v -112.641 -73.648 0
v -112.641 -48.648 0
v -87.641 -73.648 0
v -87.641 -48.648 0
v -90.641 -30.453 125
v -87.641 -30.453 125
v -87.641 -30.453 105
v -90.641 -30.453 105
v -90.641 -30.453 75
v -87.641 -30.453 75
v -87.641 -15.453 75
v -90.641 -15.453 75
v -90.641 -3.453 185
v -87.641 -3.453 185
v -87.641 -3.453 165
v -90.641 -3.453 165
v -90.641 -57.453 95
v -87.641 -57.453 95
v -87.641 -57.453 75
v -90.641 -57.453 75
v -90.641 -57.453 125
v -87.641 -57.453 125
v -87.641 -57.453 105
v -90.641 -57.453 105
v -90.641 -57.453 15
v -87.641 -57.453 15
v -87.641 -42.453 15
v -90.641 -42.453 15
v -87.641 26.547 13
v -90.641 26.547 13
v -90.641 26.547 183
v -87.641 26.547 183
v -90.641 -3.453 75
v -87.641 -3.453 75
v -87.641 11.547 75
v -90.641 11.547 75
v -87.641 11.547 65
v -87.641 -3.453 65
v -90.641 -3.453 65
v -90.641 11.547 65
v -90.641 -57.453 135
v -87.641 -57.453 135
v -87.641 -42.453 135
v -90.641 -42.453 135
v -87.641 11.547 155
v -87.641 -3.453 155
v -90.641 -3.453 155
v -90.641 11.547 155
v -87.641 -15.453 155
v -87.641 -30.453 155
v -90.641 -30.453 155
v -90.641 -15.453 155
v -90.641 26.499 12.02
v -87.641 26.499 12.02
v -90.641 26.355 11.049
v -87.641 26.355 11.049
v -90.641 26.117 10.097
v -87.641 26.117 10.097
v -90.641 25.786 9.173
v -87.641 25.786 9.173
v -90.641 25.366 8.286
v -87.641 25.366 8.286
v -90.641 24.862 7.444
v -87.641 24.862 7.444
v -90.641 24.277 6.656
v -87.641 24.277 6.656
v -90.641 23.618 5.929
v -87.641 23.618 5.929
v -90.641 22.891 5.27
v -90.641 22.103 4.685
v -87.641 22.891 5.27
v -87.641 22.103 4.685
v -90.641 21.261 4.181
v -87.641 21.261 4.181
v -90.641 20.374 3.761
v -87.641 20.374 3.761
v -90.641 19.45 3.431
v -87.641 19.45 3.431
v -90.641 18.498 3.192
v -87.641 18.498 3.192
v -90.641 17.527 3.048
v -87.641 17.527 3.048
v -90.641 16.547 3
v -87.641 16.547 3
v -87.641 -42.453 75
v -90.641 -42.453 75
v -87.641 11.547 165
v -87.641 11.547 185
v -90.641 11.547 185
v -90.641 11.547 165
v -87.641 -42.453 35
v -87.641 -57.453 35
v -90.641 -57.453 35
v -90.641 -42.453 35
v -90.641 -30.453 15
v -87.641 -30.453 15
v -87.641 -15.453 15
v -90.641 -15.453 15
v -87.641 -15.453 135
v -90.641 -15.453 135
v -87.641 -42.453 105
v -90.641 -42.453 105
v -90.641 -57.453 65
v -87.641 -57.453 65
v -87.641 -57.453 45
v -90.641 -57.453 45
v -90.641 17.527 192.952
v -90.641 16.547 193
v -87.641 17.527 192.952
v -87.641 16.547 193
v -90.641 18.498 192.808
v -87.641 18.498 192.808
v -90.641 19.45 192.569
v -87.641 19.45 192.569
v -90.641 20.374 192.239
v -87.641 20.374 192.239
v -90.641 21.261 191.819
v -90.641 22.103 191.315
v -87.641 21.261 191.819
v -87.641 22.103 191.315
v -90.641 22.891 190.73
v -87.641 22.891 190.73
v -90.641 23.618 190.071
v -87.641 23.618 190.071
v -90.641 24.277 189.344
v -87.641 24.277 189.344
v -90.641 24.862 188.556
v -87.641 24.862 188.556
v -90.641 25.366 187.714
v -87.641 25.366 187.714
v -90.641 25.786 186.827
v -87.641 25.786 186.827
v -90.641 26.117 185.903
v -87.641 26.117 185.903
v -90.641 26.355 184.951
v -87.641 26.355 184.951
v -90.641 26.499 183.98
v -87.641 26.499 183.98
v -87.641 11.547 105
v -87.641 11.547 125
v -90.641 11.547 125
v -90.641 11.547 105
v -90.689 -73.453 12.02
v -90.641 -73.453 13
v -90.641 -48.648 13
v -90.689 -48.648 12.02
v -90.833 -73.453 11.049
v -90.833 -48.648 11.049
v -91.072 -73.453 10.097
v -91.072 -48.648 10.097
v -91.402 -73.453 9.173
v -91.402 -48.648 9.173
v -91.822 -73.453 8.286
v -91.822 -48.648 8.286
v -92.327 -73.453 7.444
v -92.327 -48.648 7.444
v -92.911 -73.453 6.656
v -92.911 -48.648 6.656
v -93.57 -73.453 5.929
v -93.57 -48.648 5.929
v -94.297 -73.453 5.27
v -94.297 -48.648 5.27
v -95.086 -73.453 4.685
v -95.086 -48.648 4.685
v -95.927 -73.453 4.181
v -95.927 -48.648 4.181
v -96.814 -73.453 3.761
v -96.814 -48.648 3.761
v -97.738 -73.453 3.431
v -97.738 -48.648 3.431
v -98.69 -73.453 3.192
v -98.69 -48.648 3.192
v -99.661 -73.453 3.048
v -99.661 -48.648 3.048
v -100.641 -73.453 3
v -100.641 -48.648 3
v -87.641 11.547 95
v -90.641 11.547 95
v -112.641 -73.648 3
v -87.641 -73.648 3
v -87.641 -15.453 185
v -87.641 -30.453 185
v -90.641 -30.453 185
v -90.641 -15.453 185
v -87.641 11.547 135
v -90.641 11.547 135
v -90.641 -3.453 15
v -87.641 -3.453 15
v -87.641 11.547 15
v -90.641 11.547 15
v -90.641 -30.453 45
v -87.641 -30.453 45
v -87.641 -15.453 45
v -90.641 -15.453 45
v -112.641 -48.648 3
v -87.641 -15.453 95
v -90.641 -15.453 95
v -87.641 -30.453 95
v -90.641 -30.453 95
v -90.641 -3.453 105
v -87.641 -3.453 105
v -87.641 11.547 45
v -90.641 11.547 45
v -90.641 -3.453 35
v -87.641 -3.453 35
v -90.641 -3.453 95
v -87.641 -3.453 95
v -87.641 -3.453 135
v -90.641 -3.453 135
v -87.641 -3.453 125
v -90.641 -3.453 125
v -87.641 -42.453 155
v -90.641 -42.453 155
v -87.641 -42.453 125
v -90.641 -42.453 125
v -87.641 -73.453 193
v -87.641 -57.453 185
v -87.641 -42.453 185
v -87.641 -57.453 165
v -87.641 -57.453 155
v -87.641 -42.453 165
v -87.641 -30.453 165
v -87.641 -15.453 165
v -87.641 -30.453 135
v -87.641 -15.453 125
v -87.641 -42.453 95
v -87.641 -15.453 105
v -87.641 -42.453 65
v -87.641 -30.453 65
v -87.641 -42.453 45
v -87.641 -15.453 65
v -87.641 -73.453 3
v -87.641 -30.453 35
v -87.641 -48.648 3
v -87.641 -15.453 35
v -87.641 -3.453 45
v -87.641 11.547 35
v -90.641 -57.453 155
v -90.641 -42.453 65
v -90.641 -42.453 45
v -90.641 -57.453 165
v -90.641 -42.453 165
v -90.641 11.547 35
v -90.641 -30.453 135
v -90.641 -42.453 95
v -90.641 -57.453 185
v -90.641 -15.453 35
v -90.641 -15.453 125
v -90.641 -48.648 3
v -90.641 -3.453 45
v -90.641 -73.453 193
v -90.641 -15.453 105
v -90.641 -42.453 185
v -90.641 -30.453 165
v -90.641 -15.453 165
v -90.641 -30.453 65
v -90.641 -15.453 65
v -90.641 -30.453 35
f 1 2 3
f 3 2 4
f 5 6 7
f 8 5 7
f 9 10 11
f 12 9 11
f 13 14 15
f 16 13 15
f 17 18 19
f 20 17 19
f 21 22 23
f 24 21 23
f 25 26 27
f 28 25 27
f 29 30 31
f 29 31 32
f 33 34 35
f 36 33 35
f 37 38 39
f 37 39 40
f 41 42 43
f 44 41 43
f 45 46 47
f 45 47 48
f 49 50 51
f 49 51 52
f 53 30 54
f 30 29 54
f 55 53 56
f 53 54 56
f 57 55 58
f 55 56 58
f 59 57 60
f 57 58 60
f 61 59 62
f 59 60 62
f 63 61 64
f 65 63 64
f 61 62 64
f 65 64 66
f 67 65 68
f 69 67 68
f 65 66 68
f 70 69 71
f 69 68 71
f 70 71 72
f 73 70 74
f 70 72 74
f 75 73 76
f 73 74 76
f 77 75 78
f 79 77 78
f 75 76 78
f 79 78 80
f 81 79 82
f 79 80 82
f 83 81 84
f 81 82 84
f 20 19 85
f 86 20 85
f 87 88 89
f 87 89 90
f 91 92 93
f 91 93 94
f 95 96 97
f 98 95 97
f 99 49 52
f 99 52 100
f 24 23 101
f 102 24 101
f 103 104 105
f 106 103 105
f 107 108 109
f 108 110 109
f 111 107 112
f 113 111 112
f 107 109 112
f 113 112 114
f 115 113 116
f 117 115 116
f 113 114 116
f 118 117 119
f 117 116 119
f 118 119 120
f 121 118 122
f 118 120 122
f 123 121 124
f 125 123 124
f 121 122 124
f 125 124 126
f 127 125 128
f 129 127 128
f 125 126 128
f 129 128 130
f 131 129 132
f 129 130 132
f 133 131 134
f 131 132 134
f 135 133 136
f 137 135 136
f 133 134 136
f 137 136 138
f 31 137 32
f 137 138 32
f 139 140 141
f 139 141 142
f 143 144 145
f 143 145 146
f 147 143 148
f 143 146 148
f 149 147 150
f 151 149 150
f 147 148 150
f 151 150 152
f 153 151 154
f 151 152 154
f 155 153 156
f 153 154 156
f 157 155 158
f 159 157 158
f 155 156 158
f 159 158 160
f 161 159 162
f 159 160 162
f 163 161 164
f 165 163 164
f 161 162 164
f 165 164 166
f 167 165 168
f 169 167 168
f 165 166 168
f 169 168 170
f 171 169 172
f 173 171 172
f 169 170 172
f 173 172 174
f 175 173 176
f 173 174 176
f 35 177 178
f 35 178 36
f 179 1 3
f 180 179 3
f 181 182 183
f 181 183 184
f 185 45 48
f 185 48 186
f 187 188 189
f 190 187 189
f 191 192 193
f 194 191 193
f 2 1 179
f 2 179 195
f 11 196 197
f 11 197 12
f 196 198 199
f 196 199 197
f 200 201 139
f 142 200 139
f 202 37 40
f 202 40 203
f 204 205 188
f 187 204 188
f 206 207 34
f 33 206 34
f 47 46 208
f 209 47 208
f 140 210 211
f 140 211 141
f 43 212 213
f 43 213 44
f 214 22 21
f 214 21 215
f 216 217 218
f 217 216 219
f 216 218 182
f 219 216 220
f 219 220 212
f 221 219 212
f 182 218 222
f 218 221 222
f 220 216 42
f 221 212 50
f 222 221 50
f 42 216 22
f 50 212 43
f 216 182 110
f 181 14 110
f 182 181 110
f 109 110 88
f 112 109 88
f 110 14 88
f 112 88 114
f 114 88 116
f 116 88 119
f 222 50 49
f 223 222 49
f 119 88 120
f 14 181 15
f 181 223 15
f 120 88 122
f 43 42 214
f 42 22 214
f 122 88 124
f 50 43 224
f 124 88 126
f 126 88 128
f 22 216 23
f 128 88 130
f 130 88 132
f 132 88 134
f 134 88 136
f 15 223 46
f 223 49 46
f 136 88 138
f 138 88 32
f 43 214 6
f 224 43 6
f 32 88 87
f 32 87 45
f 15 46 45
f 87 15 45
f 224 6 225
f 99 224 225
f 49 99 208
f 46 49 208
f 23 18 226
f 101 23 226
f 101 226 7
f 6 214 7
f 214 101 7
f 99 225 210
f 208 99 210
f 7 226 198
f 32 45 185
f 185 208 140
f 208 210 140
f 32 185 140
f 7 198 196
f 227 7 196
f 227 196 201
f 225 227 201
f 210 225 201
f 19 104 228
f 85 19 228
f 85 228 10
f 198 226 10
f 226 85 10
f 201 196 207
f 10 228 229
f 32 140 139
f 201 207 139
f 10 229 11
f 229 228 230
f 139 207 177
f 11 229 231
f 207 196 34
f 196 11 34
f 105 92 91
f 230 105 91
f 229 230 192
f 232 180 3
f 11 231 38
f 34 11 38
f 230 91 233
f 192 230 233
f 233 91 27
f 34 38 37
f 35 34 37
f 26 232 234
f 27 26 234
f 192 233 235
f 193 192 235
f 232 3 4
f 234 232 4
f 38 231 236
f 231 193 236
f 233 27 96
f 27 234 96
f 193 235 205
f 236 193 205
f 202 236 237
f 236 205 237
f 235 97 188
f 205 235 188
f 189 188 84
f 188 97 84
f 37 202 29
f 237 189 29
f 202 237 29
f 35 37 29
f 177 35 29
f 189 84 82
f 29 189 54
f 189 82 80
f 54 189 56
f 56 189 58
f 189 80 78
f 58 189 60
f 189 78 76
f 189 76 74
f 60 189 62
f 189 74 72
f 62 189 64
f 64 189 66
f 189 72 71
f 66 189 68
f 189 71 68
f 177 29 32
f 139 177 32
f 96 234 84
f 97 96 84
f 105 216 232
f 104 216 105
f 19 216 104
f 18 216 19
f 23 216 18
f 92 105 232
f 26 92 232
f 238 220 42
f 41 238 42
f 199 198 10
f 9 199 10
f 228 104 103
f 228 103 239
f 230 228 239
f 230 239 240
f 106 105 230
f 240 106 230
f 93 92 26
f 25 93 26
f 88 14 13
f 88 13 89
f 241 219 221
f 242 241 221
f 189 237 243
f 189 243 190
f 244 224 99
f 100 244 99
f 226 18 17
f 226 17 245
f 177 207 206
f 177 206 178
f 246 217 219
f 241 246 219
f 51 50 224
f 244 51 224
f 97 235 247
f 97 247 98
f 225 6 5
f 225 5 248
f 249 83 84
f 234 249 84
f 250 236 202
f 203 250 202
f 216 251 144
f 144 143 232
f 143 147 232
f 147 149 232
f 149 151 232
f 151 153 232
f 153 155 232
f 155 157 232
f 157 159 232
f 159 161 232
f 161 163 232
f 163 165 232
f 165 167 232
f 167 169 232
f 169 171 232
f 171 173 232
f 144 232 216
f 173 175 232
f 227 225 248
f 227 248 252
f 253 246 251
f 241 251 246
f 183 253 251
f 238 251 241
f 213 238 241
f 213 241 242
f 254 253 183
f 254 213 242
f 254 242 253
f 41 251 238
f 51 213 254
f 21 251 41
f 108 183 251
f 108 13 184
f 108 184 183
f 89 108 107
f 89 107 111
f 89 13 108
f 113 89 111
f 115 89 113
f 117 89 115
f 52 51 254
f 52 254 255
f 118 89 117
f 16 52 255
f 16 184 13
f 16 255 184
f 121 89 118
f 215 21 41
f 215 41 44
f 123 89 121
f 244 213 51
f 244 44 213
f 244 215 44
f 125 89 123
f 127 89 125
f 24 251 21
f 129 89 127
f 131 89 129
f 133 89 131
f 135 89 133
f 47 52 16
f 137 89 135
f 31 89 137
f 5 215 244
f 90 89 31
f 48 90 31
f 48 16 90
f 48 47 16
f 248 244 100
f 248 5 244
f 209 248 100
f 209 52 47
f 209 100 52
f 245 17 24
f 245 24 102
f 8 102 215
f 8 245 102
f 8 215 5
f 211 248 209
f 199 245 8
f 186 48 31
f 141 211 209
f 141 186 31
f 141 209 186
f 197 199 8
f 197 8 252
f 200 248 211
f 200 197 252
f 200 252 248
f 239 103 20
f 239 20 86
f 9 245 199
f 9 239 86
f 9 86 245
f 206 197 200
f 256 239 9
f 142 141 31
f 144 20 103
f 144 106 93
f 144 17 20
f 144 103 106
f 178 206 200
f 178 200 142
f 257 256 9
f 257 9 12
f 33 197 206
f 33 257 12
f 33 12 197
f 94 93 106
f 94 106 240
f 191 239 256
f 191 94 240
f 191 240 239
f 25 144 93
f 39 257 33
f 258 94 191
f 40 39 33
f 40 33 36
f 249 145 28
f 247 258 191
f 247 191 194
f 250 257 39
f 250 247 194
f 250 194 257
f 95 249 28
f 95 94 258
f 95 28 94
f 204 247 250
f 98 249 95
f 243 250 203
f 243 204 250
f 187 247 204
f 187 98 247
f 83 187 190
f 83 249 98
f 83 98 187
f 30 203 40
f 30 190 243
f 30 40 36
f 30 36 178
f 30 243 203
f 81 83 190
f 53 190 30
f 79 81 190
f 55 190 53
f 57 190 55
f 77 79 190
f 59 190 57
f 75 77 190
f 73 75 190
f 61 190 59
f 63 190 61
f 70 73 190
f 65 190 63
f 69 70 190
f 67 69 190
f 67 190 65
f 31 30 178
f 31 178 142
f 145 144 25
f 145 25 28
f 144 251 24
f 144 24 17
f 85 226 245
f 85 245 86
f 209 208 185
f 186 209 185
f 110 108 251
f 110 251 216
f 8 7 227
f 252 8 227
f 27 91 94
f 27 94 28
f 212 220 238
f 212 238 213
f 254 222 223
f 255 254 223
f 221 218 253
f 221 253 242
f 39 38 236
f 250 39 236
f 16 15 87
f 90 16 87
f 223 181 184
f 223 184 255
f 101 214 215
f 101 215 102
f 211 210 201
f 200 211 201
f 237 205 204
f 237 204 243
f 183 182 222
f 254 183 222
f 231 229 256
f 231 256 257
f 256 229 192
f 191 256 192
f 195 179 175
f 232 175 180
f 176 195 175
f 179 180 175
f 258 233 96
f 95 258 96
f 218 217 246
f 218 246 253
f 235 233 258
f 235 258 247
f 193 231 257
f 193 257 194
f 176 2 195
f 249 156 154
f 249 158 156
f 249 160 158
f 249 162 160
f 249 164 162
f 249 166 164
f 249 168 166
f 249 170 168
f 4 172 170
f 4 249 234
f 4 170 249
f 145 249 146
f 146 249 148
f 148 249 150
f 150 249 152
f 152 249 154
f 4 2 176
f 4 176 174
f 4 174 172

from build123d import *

# Parameters (mm, degrees)
SKETCH_1_W          = 25
SKETCH_1_H          = 25
EXTRUDE_1_DEPTH     = 3
SKETCH_2_W          = 3
SKETCH_2_H          = 100
EXTRUDE_2_DEPTH     = 190
FILLET_1_R          = 10
SKETCH_3_W          = 20
SKETCH_3_H          = 15
CUT_EXTRUDE_2_DEPTH = 10
FILLET_2_R          = 10
FILLET_3_R          = 10


with BuildPart() as part:
    # 草图1 → 凸台-拉伸1 (new body)
    with BuildSketch(Plane.XY):
        with Locations((-100.141216583, -61.148491789)):
            Rectangle(SKETCH_1_W, SKETCH_1_H)
    extrude(amount=EXTRUDE_1_DEPTH)

    # 草图2 → 凸台-拉伸2 (add)
    with BuildSketch(Plane.XY.offset(3)):
        with Locations((-89.141216583, -23.452816851)):
            Rectangle(SKETCH_2_W, SKETCH_2_H)
    extrude(amount=EXTRUDE_2_DEPTH)

    # 圆角1
    fillet_1_edges = [part.edges().sort_by_distance(p)[0] for p in [
        (-90.641216583, -61.05065432, 3),
    ]]
    fillet(fillet_1_edges, radius=FILLET_1_R)

    # 草图3 → 切除-拉伸2 (cut)
    with BuildSketch(Plane(origin=(-87.641216583, 0, 0), x_dir=(0, 0, -1), z_dir=(1, 0, 0))):
        with Locations((-25, 4.047183149)):
            Rectangle(SKETCH_3_W, SKETCH_3_H)
        with Locations((-55, 4.047183149)):
            Rectangle(SKETCH_3_W, SKETCH_3_H)
        with Locations((-85, 4.047183149)):
            Rectangle(SKETCH_3_W, SKETCH_3_H)
        with Locations((-115, 4.047183149)):
            Rectangle(SKETCH_3_W, SKETCH_3_H)
        with Locations((-145, 4.047183149)):
            Rectangle(SKETCH_3_W, SKETCH_3_H)
        with Locations((-175, 4.047183149)):
            Rectangle(SKETCH_3_W, SKETCH_3_H)
        with Locations((-55, -22.952816851)):
            Rectangle(SKETCH_3_W, SKETCH_3_H)
        with Locations((-85, -22.952816851)):
            Rectangle(SKETCH_3_W, SKETCH_3_H)
        with Locations((-115, -22.952816851)):
            Rectangle(SKETCH_3_W, SKETCH_3_H)
        with Locations((-145, -22.952816851)):
            Rectangle(SKETCH_3_W, SKETCH_3_H)
        with Locations((-175, -22.952816851)):
            Rectangle(SKETCH_3_W, SKETCH_3_H)
        with Locations((-55, -49.952816851)):
            Rectangle(SKETCH_3_W, SKETCH_3_H)
        with Locations((-85, -49.952816851)):
            Rectangle(SKETCH_3_W, SKETCH_3_H)
        with Locations((-115, -49.952816851)):
            Rectangle(SKETCH_3_W, SKETCH_3_H)
        with Locations((-145, -49.952816851)):
            Rectangle(SKETCH_3_W, SKETCH_3_H)
        with Locations((-175, -49.952816851)):
            Rectangle(SKETCH_3_W, SKETCH_3_H)
        with Locations((-25, -22.952816851)):
            Rectangle(SKETCH_3_W, SKETCH_3_H)
        with Locations((-25, -49.952816851)):
            Rectangle(SKETCH_3_W, SKETCH_3_H)
    extrude(amount=-CUT_EXTRUDE_2_DEPTH, mode=Mode.SUBTRACT)

    # 圆角2
    fillet_2_edges = [part.edges().sort_by_distance(p)[0] for p in [
        (-89.141216583, 26.547183149, 193),
    ]]
    fillet(fillet_2_edges, radius=FILLET_2_R)

    # 圆角3
    fillet_3_edges = [part.edges().sort_by_distance(p)[0] for p in [
        (-89.141216583, 26.547183149, 3),
    ]]
    fillet(fillet_3_edges, radius=FILLET_3_R)


solid = part.part
